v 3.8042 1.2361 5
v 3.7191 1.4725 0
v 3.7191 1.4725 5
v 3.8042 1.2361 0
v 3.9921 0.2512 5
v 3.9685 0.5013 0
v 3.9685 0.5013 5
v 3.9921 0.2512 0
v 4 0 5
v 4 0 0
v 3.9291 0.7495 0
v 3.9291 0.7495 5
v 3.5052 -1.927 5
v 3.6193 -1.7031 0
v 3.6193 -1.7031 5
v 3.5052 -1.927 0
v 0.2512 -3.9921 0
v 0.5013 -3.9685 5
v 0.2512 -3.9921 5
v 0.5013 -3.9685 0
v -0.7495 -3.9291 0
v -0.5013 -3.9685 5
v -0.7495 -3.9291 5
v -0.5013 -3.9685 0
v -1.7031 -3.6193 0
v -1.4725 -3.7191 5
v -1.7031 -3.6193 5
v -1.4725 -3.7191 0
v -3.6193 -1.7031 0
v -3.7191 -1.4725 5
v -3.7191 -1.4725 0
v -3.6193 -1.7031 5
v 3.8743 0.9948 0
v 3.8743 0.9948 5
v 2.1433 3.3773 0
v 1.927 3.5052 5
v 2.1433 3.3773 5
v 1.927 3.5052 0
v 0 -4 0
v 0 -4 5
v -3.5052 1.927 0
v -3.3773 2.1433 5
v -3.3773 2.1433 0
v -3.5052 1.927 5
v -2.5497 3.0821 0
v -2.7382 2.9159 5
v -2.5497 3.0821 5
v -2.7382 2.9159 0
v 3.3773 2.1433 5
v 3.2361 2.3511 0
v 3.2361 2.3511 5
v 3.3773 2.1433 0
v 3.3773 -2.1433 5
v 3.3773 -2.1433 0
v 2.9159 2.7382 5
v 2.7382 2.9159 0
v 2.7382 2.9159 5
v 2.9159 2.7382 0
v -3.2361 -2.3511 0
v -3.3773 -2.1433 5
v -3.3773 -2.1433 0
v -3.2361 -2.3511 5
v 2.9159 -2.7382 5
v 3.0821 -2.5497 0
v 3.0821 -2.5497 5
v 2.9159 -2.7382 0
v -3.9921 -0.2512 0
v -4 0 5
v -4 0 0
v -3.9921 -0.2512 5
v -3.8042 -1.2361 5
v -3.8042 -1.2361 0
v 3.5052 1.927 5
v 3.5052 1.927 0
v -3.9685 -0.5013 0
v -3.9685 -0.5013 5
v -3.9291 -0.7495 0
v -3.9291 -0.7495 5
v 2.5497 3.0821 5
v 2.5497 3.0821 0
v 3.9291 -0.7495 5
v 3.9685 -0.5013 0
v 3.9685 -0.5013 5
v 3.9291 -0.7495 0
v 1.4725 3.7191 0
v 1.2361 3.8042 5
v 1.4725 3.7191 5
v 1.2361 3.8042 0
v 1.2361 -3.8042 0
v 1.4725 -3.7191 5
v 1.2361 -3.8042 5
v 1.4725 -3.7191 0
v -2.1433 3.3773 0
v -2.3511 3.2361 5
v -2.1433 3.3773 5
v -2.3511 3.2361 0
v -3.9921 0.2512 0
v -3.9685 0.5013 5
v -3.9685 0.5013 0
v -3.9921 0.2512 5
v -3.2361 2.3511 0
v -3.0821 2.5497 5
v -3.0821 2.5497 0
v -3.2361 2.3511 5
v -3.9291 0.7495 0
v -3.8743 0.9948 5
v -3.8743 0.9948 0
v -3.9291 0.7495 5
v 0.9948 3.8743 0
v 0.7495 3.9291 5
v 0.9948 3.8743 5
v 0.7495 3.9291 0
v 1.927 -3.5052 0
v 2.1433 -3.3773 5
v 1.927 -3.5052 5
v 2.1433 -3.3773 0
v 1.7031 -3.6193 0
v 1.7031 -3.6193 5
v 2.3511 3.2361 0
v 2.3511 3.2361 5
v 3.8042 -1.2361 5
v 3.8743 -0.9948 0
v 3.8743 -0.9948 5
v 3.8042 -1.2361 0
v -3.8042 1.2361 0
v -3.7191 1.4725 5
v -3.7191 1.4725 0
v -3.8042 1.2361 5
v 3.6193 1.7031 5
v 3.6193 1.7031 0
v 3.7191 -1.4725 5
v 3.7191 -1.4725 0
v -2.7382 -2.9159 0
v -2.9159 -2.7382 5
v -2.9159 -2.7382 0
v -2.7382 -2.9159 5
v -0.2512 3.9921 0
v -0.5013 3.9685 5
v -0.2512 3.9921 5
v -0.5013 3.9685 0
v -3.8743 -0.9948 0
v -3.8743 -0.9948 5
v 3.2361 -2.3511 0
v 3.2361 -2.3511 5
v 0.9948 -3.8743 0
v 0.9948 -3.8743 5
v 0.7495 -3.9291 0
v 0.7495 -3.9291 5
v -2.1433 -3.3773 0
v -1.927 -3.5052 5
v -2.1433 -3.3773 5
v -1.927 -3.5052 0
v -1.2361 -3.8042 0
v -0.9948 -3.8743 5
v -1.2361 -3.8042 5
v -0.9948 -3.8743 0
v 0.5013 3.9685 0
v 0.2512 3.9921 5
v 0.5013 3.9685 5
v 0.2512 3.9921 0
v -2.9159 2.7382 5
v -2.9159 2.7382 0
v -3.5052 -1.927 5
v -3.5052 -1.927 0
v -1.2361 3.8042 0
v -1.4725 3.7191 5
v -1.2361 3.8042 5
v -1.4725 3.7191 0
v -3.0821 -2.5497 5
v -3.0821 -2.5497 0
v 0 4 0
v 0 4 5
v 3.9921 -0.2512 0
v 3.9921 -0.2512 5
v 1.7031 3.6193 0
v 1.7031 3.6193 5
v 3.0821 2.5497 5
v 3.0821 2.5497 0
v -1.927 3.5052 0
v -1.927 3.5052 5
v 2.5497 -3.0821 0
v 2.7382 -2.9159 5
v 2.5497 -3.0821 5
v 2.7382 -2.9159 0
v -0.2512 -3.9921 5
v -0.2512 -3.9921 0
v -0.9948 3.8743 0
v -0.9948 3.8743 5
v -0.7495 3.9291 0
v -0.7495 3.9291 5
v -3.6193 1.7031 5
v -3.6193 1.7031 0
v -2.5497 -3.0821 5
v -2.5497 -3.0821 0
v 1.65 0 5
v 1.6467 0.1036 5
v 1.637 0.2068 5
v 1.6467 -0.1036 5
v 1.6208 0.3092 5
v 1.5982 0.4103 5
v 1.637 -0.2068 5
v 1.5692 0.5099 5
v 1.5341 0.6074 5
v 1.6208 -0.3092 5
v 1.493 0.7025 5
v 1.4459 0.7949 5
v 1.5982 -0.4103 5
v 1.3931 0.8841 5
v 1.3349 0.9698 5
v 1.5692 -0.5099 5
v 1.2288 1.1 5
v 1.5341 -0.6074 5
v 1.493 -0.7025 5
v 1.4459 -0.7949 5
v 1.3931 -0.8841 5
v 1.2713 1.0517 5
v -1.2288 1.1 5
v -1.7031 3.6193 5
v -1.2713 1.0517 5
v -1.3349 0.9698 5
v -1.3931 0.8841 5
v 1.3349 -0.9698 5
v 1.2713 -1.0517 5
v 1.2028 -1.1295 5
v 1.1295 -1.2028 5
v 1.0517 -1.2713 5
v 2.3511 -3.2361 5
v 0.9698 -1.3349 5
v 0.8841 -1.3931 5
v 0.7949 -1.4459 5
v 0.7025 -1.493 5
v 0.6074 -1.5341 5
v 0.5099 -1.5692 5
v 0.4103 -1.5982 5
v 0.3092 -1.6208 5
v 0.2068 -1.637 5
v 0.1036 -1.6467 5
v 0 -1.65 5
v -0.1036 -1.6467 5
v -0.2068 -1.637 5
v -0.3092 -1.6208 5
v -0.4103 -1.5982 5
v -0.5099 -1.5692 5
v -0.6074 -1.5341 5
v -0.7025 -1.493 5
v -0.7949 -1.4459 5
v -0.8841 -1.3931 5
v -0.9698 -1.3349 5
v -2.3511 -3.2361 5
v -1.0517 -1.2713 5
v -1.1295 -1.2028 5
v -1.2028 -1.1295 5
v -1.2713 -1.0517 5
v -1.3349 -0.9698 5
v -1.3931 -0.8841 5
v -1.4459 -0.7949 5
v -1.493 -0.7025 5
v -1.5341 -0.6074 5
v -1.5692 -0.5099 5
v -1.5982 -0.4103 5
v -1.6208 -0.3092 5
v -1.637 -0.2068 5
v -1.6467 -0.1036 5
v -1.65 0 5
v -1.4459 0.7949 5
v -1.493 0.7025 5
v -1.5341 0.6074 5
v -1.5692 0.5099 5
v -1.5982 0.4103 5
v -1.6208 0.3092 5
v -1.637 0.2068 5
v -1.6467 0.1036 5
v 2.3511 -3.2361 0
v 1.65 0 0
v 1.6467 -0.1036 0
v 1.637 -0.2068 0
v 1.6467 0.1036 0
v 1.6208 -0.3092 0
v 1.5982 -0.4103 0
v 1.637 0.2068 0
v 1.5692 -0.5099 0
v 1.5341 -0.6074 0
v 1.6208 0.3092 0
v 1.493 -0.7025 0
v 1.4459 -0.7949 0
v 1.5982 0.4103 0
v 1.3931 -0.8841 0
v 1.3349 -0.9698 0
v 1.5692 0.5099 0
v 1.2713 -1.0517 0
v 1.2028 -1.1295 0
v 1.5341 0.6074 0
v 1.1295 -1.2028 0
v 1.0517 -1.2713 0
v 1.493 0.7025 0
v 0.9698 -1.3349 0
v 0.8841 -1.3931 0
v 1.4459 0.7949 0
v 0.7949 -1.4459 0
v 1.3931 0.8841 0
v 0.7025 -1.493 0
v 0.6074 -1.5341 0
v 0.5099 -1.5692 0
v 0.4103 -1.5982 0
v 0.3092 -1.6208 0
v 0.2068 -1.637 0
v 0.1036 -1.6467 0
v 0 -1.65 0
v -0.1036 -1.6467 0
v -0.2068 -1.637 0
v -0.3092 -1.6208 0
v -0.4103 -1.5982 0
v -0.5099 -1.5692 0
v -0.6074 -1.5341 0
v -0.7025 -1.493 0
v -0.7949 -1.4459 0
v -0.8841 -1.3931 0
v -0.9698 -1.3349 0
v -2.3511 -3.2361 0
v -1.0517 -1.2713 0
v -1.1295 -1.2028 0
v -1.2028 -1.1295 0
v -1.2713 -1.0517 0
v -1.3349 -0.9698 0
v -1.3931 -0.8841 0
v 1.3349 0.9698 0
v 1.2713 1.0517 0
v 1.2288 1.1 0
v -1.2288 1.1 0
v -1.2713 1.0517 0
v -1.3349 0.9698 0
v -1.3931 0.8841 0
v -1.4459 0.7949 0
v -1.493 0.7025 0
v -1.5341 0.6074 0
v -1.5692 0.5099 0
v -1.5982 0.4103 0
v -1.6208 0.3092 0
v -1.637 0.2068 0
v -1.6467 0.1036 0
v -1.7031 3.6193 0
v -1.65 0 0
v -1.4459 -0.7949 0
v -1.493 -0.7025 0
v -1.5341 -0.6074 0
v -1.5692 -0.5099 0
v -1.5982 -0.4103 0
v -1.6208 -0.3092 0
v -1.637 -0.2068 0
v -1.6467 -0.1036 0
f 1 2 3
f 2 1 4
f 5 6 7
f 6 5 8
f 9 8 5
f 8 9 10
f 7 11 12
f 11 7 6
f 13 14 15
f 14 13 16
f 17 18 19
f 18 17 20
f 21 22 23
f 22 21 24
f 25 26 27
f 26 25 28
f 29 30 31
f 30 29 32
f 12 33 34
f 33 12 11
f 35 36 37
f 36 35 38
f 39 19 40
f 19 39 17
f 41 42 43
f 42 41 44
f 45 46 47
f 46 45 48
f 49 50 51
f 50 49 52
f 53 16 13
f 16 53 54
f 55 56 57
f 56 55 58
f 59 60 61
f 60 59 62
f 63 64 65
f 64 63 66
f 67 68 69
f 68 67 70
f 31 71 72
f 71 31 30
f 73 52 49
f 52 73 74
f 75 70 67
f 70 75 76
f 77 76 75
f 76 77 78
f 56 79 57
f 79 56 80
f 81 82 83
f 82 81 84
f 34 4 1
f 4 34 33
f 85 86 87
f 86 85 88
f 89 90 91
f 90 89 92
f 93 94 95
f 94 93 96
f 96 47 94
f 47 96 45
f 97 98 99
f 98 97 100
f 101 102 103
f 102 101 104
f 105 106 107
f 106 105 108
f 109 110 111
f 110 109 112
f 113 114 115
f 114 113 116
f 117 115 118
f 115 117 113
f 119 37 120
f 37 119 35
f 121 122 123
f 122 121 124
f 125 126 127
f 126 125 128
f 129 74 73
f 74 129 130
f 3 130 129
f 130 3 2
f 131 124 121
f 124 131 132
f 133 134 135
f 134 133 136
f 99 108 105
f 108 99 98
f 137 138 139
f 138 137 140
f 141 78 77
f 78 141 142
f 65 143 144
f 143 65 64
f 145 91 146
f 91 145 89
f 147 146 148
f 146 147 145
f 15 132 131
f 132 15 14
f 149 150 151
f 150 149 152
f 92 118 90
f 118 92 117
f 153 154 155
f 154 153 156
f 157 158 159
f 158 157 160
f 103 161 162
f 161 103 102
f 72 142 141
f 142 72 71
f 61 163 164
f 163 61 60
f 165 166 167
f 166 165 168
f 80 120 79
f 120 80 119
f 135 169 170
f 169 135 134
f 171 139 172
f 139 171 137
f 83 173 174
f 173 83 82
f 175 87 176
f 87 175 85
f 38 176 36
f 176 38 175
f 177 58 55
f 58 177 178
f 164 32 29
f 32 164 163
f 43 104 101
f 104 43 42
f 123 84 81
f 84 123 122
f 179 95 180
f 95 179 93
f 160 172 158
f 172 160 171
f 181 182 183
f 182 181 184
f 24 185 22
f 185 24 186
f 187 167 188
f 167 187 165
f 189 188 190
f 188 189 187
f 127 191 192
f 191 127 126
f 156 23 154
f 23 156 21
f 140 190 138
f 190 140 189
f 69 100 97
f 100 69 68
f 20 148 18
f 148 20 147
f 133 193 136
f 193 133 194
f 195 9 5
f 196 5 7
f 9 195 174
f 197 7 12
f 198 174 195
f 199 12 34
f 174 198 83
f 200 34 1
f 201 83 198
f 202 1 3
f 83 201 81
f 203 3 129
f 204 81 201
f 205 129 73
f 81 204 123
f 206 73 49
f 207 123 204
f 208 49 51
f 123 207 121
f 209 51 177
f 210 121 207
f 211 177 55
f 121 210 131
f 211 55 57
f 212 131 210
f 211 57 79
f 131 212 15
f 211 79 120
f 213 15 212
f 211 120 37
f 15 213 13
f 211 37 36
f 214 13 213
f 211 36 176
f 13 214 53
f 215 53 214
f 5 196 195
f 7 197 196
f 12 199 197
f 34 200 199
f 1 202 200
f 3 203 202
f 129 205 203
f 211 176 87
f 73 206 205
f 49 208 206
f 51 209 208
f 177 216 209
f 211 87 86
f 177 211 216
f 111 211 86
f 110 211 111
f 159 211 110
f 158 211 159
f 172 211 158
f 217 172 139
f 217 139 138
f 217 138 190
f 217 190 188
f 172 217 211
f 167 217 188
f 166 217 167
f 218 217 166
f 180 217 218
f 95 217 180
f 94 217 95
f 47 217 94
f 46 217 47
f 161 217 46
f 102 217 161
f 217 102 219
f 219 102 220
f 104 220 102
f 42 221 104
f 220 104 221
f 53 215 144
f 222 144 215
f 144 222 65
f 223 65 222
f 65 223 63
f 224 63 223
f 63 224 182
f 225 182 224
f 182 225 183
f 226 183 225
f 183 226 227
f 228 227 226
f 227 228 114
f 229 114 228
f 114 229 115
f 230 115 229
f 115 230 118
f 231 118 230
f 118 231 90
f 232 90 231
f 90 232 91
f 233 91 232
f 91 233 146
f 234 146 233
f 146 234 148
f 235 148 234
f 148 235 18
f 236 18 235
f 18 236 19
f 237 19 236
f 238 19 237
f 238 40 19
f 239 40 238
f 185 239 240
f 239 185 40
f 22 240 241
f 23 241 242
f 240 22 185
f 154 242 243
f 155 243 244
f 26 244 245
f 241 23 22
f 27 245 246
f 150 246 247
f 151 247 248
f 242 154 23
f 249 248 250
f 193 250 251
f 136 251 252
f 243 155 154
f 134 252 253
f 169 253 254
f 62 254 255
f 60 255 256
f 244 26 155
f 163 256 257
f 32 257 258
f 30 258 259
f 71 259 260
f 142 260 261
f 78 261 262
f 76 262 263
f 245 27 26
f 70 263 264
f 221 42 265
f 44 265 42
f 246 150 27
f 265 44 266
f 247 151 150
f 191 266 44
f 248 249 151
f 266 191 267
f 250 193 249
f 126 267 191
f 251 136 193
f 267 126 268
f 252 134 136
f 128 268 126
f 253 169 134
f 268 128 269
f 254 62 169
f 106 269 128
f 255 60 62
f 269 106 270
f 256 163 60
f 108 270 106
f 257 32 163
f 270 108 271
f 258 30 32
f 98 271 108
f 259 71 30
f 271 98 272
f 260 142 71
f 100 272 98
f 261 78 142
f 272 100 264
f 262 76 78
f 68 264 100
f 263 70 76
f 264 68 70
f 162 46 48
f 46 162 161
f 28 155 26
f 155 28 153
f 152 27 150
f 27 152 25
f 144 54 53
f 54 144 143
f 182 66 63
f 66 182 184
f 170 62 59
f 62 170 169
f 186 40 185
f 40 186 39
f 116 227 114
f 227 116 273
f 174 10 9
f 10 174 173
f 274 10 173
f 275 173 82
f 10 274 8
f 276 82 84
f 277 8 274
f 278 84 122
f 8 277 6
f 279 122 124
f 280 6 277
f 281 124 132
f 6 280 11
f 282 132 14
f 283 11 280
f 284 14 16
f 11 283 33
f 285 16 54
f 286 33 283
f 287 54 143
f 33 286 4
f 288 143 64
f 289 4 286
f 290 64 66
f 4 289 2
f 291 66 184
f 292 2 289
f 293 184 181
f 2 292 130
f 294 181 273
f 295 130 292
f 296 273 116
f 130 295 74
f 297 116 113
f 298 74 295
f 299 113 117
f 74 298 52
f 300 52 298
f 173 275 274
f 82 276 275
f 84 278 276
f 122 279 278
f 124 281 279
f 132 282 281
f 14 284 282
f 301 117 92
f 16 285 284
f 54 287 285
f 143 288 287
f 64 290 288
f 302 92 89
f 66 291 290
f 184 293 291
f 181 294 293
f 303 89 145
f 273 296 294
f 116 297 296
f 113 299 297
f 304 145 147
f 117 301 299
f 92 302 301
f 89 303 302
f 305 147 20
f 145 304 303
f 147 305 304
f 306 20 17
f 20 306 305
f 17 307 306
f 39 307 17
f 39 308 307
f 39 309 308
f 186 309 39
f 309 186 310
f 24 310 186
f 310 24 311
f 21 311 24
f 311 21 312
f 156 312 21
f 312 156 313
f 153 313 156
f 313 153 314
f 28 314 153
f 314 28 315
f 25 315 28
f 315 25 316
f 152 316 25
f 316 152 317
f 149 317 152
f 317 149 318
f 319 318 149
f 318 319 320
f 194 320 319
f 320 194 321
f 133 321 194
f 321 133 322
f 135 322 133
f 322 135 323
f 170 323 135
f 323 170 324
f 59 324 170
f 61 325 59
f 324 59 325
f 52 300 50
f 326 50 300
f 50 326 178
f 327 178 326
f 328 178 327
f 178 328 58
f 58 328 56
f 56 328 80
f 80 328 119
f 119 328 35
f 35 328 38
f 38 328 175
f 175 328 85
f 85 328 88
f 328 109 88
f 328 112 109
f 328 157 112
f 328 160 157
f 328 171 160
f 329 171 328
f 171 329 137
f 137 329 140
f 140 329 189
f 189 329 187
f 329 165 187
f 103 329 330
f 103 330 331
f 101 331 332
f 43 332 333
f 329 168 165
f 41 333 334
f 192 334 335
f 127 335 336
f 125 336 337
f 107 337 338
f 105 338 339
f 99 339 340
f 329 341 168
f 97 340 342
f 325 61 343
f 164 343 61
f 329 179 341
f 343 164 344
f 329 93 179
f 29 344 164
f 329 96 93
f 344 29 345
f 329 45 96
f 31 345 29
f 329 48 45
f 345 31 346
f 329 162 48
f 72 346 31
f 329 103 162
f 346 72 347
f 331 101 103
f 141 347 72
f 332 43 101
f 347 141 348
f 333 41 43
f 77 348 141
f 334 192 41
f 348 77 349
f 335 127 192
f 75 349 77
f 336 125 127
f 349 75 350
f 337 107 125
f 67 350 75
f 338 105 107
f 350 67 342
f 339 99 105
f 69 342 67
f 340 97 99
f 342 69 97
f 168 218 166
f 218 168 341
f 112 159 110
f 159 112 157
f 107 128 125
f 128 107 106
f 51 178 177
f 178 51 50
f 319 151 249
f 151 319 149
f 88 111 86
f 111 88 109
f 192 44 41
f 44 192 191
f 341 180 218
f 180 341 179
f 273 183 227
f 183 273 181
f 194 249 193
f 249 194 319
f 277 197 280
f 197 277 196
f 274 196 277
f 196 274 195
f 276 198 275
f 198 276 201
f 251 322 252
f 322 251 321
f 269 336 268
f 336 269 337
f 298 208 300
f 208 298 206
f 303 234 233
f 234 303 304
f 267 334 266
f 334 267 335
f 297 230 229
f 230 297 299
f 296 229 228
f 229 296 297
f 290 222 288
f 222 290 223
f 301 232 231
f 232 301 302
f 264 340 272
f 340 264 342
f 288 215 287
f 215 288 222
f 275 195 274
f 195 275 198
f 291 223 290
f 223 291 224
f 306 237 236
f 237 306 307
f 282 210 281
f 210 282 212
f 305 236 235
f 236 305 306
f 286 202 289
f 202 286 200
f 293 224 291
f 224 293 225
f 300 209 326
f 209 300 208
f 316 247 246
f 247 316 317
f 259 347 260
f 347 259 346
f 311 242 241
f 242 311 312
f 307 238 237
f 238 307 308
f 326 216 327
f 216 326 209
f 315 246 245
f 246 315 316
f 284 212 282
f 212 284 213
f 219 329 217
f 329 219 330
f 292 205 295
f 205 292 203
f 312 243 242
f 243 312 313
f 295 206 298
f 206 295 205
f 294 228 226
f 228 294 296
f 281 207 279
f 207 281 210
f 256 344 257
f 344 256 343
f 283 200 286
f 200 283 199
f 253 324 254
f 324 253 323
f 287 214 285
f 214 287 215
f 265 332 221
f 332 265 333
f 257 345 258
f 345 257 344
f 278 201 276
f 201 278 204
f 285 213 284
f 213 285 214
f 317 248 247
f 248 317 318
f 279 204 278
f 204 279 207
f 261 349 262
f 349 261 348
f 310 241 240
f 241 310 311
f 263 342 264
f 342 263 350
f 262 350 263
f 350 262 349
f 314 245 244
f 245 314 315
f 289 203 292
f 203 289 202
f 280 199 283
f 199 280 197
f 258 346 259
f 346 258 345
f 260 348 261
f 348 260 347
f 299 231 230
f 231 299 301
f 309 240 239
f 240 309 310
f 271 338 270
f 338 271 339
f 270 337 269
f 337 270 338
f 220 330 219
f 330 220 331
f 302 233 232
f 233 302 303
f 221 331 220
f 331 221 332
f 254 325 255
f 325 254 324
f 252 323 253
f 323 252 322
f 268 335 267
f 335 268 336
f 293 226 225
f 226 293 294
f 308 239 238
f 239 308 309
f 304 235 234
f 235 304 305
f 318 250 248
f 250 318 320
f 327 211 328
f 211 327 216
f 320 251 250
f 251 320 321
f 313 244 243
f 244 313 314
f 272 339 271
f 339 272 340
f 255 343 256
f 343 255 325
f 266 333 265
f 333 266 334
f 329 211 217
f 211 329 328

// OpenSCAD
$fn=100;

tol = 0.1;

difference(){
    // I need to center the original
    cylinder(r=4,h=5);
    
    translate([0,0,-2])
    cylinder(r=1.5*(1+tol),h=25);
}

translate([-1.5,1*(1+tol),0])
cube([3,1,5]);
